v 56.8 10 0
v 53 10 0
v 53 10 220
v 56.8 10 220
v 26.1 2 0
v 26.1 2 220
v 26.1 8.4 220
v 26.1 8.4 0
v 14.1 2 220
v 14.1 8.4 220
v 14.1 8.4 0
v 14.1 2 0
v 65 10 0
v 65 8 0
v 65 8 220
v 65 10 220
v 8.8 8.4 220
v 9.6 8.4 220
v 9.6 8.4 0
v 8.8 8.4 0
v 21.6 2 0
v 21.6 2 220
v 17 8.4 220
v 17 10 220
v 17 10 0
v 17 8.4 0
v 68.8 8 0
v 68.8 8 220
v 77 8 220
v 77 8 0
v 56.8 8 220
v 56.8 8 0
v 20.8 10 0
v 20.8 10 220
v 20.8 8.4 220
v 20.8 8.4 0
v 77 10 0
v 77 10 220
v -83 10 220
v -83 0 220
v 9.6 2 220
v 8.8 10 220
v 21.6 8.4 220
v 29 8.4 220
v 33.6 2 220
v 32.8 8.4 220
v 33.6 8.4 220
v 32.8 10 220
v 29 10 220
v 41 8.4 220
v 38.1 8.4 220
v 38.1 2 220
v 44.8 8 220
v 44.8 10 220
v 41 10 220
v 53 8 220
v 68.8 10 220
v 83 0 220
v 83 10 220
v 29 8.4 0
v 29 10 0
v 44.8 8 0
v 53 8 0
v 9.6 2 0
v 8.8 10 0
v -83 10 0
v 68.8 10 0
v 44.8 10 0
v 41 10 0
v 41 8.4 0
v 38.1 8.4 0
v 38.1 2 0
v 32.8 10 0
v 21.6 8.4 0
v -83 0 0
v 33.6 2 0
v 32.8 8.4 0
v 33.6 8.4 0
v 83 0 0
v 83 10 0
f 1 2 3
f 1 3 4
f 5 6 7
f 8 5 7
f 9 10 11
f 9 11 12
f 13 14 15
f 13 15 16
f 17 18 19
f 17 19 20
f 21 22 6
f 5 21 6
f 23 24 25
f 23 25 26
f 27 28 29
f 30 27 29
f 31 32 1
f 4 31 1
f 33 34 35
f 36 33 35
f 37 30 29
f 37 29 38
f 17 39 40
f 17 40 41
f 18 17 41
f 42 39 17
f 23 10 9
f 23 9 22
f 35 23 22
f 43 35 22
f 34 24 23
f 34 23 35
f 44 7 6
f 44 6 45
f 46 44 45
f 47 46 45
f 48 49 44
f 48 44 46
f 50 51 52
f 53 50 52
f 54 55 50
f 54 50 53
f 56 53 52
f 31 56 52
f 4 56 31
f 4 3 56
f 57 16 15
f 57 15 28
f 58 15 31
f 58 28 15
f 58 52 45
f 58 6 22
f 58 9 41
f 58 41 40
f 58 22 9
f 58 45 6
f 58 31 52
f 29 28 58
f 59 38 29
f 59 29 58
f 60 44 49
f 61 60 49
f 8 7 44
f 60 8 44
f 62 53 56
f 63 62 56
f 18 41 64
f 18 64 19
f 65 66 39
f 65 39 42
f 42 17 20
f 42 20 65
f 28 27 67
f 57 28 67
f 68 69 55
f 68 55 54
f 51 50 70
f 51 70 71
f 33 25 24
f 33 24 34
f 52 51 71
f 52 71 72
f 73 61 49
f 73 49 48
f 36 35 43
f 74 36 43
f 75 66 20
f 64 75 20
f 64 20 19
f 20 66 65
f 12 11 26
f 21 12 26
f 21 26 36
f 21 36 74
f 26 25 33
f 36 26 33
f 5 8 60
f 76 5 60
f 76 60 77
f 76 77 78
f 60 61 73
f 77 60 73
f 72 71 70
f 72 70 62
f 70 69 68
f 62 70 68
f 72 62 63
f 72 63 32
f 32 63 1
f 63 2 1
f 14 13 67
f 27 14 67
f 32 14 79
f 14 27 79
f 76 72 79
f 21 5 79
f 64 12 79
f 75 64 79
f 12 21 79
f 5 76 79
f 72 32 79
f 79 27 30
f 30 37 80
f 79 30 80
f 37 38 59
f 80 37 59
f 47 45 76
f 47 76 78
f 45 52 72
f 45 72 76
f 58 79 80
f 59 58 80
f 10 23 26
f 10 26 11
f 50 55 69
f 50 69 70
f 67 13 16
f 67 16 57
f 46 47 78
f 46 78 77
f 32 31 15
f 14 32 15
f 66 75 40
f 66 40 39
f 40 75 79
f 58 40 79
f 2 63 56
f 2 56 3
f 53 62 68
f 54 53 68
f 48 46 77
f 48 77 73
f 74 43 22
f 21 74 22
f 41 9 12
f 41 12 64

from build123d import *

# Parameters (mm, degrees)
SKETCH_W     = 166
SKETCH_H     = 10
PAD_DEPTH    = 220
SKETCH001_W  = 8.2
SKETCH001_H  = 2
POCKET_DEPTH = 220.001


with BuildPart() as part:
    # Sketch → Pad (new body)
    with BuildSketch(Plane.XY):
        with Locations((0, 5)):
            Rectangle(SKETCH_W, SKETCH_H)
    extrude(amount=PAD_DEPTH)

    # Sketch001 → Pocket (cut, through all)
    with BuildSketch(Plane.XY.offset(220)):
        with Locations((72.9, 9)):
            Rectangle(SKETCH001_W, SKETCH001_H)
        with Locations((60.9, 9)):
            Rectangle(SKETCH001_W, SKETCH001_H)
        Polygon((32.8, 10), (41, 10), (41, 8.4), (38.1, 8.4), (38.1, 2), (33.6, 2), (33.6, 8.4), (32.8, 8.4), align=None)
        with Locations((48.9, 9)):
            Rectangle(SKETCH001_W, SKETCH001_H)
        Polygon((20.8, 10), (20.8, 8.4), (21.6, 8.4), (21.6, 2), (26.1, 2), (26.1, 8.4), (29, 8.4), (29, 10), align=None)
        Polygon((17, 10), (17, 8.4), (14.1, 8.4), (14.1, 2), (9.6, 2), (9.6, 8.4), (8.8, 8.4), (8.8, 10), align=None)
    extrude(amount=-POCKET_DEPTH, mode=Mode.SUBTRACT)


solid = part.part
